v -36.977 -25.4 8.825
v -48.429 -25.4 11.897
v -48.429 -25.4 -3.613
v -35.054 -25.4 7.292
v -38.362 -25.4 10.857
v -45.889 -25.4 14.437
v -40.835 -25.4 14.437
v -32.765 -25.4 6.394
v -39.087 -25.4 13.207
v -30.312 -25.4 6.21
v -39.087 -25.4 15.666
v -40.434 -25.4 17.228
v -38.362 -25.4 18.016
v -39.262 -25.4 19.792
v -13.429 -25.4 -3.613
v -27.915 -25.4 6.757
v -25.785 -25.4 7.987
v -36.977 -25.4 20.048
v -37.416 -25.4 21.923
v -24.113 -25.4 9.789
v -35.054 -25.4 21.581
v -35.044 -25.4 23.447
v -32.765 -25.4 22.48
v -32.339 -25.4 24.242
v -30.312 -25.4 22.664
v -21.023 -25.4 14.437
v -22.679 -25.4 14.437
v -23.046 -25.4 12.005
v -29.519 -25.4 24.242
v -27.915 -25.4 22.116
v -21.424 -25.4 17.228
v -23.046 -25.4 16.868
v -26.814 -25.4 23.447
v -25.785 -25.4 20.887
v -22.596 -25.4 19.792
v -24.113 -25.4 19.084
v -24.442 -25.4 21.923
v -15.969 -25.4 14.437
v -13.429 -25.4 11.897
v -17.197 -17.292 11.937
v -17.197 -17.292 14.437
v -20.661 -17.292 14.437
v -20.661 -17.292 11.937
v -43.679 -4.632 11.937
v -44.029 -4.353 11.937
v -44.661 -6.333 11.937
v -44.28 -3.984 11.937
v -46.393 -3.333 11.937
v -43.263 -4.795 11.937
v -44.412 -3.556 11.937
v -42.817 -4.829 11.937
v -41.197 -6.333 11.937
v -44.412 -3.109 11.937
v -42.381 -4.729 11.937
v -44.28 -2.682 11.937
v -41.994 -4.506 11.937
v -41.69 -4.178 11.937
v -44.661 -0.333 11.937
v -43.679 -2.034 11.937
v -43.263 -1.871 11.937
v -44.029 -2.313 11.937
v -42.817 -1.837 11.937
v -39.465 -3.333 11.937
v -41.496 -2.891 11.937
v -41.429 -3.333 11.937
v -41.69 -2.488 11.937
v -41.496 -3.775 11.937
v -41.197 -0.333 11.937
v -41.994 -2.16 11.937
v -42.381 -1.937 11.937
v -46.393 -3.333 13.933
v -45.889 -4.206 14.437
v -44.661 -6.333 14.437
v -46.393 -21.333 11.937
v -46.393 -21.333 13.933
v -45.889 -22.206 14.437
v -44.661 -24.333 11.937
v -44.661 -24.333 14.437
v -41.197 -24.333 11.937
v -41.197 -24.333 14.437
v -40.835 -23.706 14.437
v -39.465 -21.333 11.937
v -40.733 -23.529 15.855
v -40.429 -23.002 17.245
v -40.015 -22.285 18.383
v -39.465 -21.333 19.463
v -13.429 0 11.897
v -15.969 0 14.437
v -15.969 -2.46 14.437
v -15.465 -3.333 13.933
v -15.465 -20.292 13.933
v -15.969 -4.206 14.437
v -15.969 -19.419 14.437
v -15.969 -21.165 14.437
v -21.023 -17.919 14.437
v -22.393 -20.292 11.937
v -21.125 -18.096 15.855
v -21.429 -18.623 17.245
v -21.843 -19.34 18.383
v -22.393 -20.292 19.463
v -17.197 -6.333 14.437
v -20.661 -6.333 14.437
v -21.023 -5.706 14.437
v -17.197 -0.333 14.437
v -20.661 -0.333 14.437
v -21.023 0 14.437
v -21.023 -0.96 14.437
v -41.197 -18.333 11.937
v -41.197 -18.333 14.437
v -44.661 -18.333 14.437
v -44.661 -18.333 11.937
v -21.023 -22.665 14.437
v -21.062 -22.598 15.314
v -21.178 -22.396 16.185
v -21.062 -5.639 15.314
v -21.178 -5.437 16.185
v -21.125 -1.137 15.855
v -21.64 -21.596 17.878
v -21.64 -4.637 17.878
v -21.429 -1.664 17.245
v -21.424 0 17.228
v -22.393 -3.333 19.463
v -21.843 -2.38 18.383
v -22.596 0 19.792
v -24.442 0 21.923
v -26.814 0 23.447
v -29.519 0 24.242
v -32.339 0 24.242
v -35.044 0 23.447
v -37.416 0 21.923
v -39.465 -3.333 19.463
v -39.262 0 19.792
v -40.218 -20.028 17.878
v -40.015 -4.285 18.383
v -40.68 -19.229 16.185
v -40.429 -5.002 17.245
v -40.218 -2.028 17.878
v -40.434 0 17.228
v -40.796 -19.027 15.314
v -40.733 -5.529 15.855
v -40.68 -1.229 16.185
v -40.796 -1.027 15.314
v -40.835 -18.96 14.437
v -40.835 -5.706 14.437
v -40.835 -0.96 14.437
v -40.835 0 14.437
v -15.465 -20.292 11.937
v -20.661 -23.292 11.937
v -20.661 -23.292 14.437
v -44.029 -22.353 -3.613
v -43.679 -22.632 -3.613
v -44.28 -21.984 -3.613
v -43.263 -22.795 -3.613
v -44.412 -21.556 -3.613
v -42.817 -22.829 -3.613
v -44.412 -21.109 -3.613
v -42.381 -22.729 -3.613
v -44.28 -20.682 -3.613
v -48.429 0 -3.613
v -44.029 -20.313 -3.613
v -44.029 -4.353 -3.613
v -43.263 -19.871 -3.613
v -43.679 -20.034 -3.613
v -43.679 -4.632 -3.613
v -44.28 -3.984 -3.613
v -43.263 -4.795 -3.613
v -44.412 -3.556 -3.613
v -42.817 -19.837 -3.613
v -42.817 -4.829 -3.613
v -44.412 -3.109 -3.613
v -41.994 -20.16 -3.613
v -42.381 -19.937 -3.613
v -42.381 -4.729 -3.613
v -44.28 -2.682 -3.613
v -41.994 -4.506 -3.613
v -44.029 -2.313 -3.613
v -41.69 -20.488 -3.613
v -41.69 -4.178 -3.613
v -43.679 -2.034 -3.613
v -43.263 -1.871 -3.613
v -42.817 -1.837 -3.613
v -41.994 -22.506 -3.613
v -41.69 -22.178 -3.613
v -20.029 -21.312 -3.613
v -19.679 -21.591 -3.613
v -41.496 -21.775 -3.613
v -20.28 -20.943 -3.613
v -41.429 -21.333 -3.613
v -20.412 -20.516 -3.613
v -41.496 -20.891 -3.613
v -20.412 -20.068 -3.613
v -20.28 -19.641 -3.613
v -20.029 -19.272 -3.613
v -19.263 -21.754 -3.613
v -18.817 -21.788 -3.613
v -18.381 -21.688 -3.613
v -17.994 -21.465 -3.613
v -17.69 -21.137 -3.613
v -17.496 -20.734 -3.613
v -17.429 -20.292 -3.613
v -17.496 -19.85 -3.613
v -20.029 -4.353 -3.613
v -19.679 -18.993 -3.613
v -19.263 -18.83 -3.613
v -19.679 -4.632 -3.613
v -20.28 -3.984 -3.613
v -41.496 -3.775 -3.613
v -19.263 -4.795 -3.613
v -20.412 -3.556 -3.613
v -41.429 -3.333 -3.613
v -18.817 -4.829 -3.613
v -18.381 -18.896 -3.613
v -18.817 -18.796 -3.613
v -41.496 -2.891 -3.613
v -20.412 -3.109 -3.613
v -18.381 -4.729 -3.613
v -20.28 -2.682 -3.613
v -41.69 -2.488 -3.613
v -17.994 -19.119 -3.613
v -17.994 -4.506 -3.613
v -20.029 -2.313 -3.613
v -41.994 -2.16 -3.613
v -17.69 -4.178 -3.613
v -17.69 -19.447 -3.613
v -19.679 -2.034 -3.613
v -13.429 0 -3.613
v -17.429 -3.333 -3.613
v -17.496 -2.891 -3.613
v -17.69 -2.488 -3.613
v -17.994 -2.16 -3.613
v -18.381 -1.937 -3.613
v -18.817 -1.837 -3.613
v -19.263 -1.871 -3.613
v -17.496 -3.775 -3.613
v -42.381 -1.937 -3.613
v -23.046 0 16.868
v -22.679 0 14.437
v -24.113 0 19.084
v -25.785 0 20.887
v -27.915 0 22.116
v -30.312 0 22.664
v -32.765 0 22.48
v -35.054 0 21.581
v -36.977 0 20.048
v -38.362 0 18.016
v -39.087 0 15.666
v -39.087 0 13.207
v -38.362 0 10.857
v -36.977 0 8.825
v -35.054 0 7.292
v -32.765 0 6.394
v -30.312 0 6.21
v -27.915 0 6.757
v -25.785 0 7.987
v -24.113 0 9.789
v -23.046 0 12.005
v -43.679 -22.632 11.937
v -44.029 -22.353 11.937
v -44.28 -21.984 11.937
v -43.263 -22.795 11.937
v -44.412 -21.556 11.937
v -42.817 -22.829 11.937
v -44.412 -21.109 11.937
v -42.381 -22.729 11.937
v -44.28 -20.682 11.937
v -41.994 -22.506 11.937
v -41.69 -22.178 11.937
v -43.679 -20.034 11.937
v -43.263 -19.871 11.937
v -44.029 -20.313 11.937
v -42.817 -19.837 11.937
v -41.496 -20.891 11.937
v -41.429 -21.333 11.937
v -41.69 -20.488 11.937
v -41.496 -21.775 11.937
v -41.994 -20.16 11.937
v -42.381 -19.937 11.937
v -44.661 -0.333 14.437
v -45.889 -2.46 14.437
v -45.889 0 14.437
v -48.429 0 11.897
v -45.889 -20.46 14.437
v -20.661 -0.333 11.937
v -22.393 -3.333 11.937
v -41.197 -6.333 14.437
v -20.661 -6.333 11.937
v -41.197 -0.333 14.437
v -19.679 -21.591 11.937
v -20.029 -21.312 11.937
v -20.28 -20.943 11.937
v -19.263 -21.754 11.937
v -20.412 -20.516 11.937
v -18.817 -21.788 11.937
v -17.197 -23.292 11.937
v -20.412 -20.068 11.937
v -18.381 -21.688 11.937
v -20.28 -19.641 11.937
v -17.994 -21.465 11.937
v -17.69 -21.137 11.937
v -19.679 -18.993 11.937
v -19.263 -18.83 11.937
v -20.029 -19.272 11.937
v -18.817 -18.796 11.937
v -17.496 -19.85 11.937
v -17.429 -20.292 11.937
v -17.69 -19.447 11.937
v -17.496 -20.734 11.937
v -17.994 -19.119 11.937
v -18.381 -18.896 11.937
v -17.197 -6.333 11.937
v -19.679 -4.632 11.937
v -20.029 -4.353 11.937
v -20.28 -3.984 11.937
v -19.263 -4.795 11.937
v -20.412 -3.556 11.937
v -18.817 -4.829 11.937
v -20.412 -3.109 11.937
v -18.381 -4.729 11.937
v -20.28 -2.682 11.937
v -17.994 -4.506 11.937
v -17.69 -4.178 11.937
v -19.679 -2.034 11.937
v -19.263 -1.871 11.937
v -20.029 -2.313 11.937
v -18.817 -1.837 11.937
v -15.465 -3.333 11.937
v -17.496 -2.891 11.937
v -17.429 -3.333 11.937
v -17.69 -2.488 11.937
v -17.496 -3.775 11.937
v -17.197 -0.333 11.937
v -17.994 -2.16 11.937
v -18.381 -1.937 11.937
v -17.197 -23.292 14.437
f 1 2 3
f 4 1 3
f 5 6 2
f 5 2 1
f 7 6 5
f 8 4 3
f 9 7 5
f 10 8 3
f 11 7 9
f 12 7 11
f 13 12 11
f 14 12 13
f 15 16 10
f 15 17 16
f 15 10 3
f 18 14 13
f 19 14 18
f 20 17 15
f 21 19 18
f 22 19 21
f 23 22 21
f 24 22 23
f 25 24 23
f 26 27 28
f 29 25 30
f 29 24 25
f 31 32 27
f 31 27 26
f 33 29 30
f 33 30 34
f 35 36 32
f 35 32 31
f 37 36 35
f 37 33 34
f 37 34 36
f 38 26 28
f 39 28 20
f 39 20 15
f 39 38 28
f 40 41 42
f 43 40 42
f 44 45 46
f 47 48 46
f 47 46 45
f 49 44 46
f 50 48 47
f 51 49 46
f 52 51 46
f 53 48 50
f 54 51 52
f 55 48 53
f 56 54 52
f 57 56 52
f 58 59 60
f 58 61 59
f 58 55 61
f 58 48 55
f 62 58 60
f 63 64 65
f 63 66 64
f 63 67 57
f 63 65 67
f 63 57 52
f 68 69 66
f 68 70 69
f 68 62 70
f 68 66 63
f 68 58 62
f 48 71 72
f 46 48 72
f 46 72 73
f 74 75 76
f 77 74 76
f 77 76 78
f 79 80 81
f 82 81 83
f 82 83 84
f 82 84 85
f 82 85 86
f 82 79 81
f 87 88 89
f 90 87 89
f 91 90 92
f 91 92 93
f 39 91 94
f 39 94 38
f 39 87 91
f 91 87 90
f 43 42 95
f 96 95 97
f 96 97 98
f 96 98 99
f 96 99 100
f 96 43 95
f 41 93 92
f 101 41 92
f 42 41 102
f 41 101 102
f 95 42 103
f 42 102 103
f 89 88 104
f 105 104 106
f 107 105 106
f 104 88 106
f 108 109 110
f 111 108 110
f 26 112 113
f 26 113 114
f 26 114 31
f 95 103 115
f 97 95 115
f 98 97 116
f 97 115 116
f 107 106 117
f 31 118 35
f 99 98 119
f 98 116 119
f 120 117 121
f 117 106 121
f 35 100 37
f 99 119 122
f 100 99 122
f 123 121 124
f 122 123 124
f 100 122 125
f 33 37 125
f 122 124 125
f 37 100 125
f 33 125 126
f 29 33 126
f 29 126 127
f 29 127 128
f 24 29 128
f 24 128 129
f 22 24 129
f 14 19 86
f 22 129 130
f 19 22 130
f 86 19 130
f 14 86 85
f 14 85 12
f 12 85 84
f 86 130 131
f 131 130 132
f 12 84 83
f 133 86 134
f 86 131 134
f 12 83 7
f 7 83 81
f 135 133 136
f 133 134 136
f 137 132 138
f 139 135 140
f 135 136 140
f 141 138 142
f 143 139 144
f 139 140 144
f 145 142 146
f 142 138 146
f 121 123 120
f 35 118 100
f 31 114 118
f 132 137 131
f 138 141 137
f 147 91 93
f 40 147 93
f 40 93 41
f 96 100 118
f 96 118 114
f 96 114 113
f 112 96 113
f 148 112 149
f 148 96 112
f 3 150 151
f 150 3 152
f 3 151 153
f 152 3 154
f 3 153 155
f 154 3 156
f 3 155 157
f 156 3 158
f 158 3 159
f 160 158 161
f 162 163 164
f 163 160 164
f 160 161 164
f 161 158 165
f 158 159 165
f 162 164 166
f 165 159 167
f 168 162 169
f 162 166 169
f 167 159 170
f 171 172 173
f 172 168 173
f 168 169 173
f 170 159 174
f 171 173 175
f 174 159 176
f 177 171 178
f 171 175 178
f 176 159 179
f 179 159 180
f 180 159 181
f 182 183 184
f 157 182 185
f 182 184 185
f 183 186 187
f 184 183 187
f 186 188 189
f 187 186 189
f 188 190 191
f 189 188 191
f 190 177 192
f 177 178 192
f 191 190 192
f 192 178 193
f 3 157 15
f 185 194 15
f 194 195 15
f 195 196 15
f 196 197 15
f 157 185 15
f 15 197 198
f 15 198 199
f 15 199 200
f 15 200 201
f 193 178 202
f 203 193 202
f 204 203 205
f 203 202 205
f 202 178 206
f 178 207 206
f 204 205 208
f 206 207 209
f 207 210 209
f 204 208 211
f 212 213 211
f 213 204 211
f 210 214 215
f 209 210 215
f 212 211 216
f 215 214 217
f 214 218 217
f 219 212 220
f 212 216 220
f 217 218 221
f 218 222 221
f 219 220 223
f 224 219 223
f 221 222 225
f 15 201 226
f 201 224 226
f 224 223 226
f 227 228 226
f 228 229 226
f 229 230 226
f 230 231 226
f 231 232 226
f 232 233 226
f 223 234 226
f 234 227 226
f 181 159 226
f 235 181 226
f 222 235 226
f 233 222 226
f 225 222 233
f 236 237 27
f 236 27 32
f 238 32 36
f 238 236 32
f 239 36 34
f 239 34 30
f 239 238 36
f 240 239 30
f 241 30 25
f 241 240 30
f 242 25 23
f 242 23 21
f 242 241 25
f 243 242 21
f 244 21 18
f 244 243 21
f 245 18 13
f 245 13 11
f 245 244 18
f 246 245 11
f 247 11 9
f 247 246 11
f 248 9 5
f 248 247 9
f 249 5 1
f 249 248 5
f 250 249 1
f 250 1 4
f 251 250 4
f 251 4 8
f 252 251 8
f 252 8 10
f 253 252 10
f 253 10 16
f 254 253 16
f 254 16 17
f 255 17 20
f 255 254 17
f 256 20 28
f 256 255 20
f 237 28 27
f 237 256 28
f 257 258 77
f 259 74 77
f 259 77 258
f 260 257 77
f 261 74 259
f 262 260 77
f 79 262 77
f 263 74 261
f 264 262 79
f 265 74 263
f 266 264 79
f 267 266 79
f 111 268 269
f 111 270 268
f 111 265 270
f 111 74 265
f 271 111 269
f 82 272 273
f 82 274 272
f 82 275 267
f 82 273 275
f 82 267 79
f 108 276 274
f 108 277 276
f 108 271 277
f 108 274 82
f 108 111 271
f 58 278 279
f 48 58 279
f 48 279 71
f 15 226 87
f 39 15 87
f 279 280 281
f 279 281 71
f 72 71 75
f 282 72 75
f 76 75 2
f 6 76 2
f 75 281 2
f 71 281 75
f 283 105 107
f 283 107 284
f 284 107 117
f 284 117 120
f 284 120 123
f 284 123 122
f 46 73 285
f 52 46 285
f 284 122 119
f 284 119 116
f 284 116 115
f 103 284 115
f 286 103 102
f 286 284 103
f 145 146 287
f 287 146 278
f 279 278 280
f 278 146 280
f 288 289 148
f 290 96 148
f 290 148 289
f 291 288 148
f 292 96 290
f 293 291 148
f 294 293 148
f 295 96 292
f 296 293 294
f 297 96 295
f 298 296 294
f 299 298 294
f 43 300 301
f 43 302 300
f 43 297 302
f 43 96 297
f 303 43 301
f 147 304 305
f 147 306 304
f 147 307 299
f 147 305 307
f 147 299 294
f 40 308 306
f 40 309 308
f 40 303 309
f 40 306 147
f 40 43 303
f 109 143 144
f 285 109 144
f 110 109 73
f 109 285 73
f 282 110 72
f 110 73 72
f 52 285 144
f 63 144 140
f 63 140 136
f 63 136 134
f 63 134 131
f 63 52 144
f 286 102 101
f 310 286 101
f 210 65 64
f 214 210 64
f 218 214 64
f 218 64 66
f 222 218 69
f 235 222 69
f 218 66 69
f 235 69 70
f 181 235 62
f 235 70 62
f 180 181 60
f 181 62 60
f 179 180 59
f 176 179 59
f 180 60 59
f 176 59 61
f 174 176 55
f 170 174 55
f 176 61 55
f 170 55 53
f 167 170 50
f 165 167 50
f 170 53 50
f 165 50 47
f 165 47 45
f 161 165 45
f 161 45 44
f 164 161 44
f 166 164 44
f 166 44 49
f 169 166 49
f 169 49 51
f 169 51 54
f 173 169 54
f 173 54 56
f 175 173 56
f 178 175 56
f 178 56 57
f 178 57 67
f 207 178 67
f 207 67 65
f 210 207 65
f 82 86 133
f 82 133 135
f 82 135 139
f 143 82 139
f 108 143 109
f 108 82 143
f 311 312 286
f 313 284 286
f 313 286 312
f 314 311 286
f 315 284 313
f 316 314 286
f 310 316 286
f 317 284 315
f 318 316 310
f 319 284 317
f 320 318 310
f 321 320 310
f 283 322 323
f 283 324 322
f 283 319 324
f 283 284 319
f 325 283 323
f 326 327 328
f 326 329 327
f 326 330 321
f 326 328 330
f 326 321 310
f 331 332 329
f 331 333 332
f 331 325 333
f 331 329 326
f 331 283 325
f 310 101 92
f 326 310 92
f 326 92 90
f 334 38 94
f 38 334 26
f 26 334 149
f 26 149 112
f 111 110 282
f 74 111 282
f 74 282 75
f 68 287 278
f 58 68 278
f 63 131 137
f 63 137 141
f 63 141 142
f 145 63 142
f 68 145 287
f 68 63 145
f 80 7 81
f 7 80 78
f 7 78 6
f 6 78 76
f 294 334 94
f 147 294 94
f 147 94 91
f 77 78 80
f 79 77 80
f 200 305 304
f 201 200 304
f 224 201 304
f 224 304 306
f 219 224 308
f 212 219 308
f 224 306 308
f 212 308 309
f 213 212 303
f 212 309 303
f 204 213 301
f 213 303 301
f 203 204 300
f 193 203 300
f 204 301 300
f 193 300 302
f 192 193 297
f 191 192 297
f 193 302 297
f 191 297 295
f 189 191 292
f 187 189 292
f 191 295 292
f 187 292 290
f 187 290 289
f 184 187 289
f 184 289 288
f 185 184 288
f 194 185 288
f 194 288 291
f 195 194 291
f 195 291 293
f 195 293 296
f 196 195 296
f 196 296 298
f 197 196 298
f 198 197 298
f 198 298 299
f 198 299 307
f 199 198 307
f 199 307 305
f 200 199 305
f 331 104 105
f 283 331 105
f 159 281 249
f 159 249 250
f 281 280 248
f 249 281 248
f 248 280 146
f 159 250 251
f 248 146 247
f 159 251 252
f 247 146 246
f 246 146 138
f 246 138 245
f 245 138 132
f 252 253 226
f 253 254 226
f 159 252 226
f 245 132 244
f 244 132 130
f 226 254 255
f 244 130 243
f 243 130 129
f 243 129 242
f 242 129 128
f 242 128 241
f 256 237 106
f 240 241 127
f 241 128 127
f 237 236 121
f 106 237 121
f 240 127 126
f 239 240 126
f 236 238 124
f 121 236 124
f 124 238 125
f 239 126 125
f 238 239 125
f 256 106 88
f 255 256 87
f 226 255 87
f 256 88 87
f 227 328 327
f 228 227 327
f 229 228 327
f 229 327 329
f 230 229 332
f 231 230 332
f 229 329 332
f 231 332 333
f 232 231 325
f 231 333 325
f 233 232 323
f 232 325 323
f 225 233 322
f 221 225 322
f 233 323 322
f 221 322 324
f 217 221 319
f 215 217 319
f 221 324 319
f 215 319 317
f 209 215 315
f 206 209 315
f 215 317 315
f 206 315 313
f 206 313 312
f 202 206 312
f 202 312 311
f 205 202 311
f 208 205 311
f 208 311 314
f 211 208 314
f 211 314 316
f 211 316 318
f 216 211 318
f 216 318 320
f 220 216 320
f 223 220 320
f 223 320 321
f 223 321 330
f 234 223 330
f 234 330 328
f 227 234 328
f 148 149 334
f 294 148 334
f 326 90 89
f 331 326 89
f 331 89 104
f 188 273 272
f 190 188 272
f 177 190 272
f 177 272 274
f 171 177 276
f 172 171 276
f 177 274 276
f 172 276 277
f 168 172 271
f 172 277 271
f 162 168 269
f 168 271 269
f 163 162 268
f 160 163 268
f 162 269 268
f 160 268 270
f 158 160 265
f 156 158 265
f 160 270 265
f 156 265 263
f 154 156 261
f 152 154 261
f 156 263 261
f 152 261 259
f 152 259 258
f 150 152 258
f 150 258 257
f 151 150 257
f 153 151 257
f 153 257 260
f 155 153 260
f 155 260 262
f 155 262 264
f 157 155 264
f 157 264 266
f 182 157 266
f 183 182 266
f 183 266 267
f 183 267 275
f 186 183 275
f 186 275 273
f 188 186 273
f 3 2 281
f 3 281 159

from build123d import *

# Parameters (mm, degrees)
F0_R          = 8.25
F1_DEPTH      = 25.4
F2_R          = 1.5
F3_DEPTH      = 18.051
F4_SIZE       = 2.54
F5_R          = 1.5
F6_DEPTH      = 2.5
F6_DEPTH_BACK = 25.4


with BuildPart() as f1:
    # F0 (on Front) → F1 (new body)
    with BuildSketch(Plane.XZ):
        with BuildLine():
            Line((-13.4290065467, 14.4366604356), (-21.0230065467, 14.4366604356))
            ThreePointArc((-21.0230065467, 14.4366604356), (-30.9290065467, 24.3426604356), (-40.8350065467, 14.4366604356))
            Line((-40.8350065467, 14.4366604356), (-48.4290065467, 14.4366604356))
            Line((-48.4290065467, 14.4366604356), (-48.4290065467, -3.6133395644))
            Line((-48.4290065467, -3.6133395644), (-13.4290065467, -3.6133395644))
            Line((-13.4290065467, -3.6133395644), (-13.4290065467, 14.4366604356))
        make_face()
        with Locations((-30.9290065467, 14.4366604356)):
            Circle(F0_R, mode=Mode.SUBTRACT)
    extrude(amount=F1_DEPTH)

    # F2 (on face) → F3 (cut, through all)
    with BuildSketch(Plane.XY.offset(14.4366604356)):
        with Locations((-42.9290065467, -21.332904214)):
            Circle(F2_R)
        with Locations((-42.9290065467, -3.332904214)):
            Circle(F2_R)
        with Locations((-18.9290065467, -3.332904214)):
            Circle(F2_R)
        with Locations((-18.9290065467, -20.2919691801)):
            Circle(F2_R)
    extrude(amount=-F3_DEPTH, mode=Mode.SUBTRACT)

    # F4
    f4_edges = [f1.edges().sort_by_distance(p)[0] for p in [
        (-48.429007, -12.7, 14.43666),
        (-13.429007, -12.7, 14.43666),
    ]]
    chamfer(f4_edges, length=F4_SIZE)

    # F5 (on face) → F6 (cut, two sides)
    with BuildSketch(Plane.XY.offset(14.4366604356)) as f6_sk:
        Polygon((-44.6610573543, -6.332904214), (-41.1969557392, -6.332904214), (-39.4649049316, -3.332904214), (-41.1969557392, -0.332904214), (-44.6610573543, -0.332904214), (-46.3931081619, -3.332904214), align=None)
        with Locations((-42.9290065467, -3.332904214)):
            Circle(F5_R, mode=Mode.SUBTRACT)
        Polygon((-44.6610573543, -24.332904214), (-41.1969557392, -24.332904214), (-39.4649049316, -21.332904214), (-41.1969557392, -18.332904214), (-44.6610573543, -18.332904214), (-46.3931081619, -21.332904214), align=None)
        with Locations((-42.9290065467, -21.332904214)):
            Circle(F5_R, mode=Mode.SUBTRACT)
        Polygon((-20.6610573543, -6.332904214), (-17.1969557392, -6.332904214), (-15.4649049316, -3.332904214), (-17.1969557392, -0.332904214), (-20.6610573543, -0.332904214), (-22.3931081619, -3.332904214), align=None)
        with Locations((-18.9290065467, -3.332904214)):
            Circle(F5_R, mode=Mode.SUBTRACT)
        Polygon((-20.6610573543, -23.2919691801), (-17.1969557392, -23.2919691801), (-15.4649049316, -20.2919691801), (-17.1969557392, -17.2919691801), (-20.6610573543, -17.2919691801), (-22.3931081619, -20.2919691801), align=None)
        with Locations((-18.9290065467, -20.2919691801)):
            Circle(F5_R, mode=Mode.SUBTRACT)
    extrude(amount=-F6_DEPTH, mode=Mode.SUBTRACT)
    extrude(f6_sk.sketch, amount=F6_DEPTH_BACK, mode=Mode.SUBTRACT)


solid = f1.part
